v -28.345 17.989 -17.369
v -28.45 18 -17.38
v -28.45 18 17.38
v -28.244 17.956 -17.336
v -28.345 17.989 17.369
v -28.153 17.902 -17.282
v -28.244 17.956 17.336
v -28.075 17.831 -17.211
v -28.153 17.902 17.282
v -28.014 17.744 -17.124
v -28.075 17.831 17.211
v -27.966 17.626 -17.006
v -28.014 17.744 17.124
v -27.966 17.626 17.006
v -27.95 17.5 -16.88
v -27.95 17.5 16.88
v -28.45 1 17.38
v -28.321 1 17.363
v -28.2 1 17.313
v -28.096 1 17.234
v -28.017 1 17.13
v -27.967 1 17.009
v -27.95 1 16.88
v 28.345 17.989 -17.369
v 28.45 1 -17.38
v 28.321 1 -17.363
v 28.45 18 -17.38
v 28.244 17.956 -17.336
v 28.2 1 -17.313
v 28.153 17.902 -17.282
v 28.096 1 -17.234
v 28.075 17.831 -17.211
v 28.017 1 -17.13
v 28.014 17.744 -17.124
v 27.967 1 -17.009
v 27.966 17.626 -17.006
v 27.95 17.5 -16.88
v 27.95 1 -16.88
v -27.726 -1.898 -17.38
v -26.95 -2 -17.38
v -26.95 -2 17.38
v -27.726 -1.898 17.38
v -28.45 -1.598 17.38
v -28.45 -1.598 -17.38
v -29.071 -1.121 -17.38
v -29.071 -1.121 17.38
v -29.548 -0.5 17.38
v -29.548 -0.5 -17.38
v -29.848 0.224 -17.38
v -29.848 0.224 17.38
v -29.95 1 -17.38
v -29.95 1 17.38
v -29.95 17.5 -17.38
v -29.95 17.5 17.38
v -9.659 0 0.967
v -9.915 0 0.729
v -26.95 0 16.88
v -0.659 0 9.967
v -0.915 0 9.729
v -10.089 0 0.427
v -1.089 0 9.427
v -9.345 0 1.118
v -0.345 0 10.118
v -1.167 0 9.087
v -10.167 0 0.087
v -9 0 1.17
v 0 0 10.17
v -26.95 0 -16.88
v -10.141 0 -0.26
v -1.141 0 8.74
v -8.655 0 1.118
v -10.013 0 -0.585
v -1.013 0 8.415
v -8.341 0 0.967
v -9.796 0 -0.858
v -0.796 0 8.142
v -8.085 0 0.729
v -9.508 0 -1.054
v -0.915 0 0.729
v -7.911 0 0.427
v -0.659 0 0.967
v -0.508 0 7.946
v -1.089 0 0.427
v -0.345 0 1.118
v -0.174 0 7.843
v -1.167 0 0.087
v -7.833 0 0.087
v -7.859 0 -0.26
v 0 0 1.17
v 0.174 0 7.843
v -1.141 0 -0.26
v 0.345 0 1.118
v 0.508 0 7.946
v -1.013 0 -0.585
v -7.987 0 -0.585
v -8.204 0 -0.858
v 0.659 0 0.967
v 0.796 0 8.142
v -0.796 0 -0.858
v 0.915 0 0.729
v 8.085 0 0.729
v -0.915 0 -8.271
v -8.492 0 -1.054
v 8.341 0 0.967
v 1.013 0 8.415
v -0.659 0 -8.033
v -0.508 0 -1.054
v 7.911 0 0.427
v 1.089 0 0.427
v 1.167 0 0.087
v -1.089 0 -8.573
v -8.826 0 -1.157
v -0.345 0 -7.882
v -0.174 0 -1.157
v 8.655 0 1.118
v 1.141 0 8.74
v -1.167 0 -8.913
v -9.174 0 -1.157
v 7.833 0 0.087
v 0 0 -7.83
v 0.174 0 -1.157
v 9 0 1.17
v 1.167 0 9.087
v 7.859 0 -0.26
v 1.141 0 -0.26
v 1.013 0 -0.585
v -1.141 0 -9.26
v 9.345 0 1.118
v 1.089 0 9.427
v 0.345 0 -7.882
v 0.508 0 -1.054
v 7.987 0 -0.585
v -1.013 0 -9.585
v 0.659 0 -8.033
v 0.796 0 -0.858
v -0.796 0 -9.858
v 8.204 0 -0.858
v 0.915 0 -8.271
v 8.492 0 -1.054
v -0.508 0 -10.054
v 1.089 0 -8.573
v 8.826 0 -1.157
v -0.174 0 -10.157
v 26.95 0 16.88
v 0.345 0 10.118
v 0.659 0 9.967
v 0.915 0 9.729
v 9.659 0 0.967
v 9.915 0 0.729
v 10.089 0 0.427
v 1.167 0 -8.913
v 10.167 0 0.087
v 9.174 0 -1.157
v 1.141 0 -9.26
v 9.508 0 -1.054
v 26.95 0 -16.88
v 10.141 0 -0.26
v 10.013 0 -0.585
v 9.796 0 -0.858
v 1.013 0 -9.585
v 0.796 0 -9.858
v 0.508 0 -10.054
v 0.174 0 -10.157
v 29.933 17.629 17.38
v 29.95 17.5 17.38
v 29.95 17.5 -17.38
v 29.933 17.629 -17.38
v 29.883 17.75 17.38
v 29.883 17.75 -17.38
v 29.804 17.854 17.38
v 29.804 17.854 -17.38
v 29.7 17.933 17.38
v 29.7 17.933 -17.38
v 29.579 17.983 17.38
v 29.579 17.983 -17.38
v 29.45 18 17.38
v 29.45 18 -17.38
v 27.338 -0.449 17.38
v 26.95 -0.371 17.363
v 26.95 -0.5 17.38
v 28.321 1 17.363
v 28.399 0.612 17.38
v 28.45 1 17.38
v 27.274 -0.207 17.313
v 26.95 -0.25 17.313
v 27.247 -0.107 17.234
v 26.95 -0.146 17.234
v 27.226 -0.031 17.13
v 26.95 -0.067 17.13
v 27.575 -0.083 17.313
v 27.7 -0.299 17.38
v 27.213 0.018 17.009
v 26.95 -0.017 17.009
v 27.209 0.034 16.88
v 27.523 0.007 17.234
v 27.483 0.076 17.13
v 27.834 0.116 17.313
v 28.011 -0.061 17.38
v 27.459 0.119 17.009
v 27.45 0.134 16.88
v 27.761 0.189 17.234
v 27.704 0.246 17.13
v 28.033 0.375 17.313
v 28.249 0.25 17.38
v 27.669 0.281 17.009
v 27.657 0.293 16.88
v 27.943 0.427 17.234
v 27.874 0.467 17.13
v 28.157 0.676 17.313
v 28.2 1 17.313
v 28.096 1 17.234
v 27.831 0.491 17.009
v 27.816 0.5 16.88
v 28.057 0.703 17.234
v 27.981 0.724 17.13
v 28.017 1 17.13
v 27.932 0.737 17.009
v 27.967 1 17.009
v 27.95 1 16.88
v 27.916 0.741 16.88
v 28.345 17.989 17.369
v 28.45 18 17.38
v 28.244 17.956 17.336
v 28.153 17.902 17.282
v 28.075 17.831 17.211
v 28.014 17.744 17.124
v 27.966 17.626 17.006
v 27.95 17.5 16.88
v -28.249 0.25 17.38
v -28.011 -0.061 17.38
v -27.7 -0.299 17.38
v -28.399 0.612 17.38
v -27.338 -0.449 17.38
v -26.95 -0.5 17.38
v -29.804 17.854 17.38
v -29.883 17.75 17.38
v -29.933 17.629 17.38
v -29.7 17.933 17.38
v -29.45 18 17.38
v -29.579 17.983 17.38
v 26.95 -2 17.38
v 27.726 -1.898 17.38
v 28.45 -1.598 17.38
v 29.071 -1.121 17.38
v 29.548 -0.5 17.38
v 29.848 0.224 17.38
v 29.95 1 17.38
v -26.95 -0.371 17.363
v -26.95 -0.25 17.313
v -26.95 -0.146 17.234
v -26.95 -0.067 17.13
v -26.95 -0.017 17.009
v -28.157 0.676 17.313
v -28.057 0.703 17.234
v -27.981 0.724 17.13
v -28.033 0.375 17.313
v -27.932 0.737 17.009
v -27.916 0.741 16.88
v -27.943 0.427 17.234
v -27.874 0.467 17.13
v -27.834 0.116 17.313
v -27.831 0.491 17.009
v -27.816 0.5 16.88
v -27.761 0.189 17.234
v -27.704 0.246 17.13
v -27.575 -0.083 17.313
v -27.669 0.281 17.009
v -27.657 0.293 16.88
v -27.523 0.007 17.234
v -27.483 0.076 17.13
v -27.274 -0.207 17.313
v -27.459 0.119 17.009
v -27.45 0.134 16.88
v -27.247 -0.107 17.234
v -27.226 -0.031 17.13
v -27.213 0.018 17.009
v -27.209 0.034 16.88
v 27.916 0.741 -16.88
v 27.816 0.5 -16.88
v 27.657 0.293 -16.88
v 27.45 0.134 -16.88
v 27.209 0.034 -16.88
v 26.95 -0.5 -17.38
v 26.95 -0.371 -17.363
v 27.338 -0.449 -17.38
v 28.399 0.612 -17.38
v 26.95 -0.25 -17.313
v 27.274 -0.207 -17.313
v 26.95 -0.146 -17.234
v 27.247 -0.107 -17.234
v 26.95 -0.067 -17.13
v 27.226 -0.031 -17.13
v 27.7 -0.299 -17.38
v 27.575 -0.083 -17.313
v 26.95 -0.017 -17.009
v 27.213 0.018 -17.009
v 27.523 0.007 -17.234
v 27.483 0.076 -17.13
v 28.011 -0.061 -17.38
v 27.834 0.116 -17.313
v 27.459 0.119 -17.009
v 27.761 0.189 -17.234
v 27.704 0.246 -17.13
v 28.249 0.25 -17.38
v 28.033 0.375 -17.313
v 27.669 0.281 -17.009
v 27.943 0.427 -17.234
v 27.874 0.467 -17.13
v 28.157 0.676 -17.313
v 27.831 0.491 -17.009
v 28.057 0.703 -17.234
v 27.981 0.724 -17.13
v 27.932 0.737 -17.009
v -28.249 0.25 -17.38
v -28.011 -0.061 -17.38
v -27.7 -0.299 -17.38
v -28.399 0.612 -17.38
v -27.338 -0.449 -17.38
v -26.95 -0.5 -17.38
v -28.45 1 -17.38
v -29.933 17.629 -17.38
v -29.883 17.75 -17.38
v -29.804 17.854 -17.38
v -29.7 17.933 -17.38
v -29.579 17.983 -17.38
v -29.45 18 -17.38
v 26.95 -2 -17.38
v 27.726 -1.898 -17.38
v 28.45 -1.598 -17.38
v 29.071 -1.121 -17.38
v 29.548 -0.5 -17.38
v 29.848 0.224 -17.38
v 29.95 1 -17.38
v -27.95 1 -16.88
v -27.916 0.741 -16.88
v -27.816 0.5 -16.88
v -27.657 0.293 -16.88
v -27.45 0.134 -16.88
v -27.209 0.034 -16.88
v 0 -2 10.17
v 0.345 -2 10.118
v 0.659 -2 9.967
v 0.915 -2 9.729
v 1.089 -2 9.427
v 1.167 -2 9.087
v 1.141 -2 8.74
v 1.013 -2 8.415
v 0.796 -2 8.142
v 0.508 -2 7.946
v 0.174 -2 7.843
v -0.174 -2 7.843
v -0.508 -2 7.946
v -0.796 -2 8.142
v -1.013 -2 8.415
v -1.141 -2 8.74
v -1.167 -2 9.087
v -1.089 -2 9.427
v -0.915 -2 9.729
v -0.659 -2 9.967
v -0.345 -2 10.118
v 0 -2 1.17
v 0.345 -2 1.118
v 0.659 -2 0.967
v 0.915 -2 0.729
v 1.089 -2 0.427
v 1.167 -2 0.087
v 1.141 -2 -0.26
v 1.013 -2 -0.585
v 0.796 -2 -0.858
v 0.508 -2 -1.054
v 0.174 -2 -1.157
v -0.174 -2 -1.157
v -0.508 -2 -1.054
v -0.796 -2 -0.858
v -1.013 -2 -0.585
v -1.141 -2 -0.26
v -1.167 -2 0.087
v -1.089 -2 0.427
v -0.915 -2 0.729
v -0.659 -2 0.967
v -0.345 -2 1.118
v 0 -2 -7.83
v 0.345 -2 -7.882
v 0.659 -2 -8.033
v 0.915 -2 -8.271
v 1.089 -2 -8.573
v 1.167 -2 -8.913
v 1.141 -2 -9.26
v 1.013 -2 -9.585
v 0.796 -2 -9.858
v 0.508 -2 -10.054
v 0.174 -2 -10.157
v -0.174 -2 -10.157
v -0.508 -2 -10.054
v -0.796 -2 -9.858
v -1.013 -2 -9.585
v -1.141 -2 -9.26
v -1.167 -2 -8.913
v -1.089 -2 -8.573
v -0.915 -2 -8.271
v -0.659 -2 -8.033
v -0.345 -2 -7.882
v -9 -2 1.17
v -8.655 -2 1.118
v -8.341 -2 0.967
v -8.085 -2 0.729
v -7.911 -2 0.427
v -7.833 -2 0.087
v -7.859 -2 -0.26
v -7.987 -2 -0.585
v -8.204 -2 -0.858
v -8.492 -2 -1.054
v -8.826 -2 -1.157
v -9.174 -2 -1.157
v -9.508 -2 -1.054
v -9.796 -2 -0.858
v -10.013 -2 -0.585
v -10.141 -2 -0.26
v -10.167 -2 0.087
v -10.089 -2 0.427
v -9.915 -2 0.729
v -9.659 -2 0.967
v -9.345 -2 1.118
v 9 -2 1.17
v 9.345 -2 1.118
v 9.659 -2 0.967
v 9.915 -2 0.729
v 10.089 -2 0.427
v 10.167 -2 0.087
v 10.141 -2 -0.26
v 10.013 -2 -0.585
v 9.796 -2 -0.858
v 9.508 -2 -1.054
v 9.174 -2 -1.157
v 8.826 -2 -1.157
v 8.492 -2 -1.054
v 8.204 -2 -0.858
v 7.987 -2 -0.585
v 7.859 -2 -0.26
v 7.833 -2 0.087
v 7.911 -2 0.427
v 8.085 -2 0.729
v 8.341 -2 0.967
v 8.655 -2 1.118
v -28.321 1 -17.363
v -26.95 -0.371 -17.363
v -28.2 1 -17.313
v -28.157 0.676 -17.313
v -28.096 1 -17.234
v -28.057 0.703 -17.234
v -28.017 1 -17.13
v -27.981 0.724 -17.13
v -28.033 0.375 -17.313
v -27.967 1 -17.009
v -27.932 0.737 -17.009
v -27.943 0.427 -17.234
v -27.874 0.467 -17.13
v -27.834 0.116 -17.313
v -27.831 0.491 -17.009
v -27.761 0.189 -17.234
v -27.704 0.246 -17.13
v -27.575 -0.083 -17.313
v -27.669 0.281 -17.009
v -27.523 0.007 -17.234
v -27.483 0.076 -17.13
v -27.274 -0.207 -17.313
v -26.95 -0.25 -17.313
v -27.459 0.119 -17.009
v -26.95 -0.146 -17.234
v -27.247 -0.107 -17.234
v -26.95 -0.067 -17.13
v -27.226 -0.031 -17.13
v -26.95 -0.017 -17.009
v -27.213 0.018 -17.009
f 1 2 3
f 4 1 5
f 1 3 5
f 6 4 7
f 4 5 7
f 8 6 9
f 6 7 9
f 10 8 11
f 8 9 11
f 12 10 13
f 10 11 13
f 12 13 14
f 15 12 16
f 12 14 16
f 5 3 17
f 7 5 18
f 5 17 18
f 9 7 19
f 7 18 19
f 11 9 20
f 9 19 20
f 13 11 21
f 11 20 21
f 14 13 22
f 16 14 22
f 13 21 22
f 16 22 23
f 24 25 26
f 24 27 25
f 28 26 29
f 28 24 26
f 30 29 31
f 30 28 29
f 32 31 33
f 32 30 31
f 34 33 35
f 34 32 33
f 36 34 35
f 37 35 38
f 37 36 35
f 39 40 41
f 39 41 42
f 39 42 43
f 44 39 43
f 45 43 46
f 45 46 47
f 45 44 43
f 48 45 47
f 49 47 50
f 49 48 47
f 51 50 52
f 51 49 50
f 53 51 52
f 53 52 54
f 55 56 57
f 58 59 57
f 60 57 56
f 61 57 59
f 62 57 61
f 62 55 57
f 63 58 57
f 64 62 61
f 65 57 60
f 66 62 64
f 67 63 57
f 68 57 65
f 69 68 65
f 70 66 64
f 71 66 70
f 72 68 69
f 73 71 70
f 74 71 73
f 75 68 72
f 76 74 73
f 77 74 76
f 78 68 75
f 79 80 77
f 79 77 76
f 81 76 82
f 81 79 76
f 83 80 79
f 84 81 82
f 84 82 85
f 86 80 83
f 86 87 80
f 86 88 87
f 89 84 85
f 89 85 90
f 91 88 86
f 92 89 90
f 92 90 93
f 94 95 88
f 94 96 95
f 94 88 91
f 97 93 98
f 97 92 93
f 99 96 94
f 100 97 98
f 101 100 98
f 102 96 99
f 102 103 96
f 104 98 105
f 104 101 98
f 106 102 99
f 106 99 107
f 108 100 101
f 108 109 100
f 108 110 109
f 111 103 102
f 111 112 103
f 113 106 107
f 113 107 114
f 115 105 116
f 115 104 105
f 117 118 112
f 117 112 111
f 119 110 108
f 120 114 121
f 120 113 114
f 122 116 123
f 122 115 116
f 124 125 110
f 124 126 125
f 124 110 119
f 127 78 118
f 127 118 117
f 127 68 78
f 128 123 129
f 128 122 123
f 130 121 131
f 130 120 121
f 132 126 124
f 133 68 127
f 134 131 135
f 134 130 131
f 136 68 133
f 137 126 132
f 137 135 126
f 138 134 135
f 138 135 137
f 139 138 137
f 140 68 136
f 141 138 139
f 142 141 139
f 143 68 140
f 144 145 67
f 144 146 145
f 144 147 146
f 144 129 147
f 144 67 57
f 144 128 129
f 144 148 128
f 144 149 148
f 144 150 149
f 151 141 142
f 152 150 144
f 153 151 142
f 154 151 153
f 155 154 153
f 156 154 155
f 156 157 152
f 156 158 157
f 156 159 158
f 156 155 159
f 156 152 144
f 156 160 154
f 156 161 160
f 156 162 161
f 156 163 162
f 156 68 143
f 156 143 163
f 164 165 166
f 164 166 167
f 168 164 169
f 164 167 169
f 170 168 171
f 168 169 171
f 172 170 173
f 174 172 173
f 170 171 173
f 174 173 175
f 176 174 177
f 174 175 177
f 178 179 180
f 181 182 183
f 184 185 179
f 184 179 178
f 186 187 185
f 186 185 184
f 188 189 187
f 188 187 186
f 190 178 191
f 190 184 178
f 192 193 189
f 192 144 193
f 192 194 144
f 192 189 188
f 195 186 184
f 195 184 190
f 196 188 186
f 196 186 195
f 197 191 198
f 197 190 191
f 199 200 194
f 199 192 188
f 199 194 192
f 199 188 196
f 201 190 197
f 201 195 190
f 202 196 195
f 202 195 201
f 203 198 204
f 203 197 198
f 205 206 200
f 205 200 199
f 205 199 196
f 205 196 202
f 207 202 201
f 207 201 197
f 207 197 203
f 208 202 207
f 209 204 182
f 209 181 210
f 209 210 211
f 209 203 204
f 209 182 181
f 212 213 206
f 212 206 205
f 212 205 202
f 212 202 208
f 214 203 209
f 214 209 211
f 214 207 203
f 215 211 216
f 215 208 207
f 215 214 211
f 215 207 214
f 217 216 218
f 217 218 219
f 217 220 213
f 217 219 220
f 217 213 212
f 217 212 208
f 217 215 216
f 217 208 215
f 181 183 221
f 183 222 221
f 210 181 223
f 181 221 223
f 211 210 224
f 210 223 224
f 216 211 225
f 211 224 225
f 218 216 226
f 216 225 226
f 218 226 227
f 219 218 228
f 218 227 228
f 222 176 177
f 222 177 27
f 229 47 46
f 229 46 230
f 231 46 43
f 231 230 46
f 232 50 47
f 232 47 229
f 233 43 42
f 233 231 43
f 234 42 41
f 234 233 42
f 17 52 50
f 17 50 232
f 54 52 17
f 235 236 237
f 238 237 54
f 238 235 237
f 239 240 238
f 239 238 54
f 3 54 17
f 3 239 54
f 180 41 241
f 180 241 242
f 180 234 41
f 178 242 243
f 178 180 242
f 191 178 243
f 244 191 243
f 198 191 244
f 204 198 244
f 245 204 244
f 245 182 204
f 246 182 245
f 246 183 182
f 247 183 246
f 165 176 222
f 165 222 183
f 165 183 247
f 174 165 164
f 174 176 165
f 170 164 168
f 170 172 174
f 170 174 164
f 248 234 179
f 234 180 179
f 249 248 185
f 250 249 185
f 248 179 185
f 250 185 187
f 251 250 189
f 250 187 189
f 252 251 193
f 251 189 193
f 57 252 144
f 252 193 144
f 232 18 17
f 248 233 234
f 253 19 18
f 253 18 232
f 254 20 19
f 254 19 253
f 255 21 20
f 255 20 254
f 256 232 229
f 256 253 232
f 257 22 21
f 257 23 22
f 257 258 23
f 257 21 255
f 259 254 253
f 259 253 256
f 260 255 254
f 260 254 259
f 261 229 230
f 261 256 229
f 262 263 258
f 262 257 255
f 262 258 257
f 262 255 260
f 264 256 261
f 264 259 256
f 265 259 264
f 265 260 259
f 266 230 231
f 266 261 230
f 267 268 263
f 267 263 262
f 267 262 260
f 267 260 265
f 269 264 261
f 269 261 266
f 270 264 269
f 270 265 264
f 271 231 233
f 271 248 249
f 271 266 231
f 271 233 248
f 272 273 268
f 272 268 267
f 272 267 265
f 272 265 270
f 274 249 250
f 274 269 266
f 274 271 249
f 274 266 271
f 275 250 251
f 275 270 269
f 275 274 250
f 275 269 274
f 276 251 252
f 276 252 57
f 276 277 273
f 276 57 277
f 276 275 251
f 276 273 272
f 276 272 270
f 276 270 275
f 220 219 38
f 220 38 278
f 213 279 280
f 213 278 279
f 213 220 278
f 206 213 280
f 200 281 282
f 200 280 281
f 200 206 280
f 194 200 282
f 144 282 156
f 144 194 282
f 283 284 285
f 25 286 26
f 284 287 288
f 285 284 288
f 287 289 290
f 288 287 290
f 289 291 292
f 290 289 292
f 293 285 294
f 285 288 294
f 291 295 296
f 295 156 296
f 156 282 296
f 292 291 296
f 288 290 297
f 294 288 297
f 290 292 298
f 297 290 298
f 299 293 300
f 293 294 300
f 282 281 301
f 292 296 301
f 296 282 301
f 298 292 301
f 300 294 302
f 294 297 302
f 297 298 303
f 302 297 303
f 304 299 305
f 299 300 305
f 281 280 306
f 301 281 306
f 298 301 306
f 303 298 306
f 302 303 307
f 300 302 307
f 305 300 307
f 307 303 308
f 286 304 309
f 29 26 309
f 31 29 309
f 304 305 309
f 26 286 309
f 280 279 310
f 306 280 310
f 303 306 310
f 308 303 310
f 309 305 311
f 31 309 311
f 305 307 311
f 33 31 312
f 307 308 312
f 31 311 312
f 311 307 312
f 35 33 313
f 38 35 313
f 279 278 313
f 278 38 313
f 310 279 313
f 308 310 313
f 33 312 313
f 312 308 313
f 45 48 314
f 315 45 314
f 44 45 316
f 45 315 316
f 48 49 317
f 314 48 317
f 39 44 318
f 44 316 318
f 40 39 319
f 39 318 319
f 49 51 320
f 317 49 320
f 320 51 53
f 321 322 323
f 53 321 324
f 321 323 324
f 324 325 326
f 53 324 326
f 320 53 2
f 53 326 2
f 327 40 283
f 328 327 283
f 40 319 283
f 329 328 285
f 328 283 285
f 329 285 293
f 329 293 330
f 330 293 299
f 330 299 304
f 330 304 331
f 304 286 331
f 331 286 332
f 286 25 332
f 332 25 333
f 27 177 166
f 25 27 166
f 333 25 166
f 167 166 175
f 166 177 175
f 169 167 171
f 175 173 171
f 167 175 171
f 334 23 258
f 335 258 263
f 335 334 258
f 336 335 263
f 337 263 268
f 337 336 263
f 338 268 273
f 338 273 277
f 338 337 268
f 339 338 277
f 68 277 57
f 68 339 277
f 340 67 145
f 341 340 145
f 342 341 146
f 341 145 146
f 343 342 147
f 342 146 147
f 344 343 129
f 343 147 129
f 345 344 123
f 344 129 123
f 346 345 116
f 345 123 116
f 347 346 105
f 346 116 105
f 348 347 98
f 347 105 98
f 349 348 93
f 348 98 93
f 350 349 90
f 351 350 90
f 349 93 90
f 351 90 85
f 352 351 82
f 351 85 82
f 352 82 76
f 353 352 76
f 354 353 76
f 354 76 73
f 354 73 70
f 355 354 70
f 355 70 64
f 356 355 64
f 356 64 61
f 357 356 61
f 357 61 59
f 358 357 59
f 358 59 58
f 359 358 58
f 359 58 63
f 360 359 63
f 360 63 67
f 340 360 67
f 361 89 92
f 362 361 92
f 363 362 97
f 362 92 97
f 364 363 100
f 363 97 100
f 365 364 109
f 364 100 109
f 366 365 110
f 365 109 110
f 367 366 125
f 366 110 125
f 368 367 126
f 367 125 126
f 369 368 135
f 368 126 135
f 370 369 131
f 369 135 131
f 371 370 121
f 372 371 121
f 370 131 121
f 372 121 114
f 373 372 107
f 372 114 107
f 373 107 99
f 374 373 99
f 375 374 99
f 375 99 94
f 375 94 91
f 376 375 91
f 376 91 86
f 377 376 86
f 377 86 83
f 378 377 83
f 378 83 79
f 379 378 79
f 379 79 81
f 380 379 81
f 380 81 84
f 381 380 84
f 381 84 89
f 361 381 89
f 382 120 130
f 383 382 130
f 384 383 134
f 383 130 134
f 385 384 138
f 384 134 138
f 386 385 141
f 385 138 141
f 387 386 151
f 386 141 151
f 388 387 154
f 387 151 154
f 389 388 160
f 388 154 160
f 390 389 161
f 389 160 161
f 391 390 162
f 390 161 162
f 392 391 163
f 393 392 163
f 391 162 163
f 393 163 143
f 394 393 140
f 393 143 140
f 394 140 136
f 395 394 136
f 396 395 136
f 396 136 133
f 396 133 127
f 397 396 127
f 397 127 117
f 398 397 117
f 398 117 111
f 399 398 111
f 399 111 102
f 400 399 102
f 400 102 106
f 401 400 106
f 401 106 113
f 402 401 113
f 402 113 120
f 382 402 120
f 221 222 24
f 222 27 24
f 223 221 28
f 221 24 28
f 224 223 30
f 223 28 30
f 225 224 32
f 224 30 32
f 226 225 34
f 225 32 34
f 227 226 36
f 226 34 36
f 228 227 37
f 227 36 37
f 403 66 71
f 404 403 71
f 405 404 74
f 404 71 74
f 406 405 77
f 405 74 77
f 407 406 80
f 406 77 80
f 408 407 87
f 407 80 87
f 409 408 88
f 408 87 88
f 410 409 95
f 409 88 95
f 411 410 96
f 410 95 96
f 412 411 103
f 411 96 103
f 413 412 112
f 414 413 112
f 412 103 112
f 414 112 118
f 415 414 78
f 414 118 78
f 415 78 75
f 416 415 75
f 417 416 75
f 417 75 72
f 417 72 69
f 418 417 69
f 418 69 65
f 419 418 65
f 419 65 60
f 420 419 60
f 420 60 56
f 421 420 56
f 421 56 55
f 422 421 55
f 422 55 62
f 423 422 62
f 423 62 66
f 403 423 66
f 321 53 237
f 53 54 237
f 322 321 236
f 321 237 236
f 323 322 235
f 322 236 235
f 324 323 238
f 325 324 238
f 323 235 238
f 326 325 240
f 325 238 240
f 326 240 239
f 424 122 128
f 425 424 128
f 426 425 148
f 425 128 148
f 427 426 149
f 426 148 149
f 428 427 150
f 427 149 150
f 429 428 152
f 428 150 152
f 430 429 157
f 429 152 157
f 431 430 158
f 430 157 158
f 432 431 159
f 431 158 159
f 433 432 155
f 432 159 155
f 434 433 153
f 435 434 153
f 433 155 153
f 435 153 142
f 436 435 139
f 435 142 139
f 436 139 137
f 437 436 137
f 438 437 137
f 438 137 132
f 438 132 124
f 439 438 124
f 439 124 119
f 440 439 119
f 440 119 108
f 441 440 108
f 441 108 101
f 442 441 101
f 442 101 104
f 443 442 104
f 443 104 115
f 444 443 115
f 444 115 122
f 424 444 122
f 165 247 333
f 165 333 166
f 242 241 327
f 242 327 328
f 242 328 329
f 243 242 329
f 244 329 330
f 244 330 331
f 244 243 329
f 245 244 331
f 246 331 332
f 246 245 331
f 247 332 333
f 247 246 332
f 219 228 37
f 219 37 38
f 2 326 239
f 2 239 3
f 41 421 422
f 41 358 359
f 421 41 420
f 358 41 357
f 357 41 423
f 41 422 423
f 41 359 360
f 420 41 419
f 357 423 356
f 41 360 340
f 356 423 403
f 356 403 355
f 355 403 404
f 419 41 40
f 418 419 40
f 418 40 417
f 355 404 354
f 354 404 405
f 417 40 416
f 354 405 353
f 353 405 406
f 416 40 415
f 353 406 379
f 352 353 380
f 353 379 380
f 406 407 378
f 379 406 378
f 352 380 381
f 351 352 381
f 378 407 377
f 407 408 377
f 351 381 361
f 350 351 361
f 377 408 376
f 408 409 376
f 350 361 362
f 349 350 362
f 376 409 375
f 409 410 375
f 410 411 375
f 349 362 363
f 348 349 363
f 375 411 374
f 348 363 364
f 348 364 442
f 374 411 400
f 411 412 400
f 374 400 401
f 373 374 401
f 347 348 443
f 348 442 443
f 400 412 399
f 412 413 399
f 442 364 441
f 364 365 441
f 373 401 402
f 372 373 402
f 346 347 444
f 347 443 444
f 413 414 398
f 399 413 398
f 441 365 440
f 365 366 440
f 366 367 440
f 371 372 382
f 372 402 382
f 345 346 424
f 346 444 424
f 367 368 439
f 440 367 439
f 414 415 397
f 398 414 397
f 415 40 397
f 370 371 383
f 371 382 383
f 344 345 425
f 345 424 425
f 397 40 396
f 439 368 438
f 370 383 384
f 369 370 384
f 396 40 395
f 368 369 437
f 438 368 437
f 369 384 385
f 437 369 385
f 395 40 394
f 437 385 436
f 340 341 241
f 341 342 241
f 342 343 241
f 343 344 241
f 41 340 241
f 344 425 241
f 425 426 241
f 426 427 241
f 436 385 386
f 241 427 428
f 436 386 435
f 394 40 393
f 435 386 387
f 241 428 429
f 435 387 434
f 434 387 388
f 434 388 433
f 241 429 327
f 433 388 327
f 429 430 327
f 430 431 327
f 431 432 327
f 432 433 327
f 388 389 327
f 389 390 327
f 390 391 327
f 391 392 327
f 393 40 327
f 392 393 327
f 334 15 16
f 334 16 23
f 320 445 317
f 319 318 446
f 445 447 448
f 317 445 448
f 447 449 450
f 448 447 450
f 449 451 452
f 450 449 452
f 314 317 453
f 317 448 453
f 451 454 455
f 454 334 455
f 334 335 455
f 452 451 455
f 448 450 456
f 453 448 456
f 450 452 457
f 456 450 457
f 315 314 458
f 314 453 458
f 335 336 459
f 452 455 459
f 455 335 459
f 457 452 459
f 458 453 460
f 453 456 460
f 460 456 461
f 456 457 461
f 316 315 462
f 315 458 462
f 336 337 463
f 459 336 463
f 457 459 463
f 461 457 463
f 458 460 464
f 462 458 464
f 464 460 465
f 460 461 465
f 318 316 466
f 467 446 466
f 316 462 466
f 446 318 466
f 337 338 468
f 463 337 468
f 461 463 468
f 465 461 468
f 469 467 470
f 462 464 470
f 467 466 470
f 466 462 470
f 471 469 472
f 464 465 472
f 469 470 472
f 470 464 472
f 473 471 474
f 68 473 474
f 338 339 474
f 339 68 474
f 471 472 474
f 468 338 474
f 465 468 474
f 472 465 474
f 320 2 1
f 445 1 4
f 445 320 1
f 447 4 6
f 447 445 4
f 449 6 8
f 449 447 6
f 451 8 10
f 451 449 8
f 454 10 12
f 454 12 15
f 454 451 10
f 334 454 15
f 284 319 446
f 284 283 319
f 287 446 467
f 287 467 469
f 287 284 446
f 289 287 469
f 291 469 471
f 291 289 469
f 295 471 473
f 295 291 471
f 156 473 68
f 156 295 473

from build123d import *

# Parameters (mm, degrees)
SKETCH1_W                      = 59.9
SKETCH1_H                      = 34.76
BASE_FLANGE1_DEPTH             = 2
EDGE_FLANGE1_STRIP_W           = 10
EDGE_FLANGE1_STRIP_H           = 2
EDGE_FLANGE1_STRIP_CUT_DEPTH   = 34.76
EDGE_FLANGE1_STRIP_2_W         = 10
EDGE_FLANGE1_STRIP_2_H         = 2
EDGE_FLANGE1_STRIP_CUT_2_DEPTH = 34.76
EDGE_FLANGE1_DEPTH             = 34.76
EDGE_FLANGE1_BEND_DEPTH        = 34.76
FILLET1_R                      = 0.5
SKETCH8_R                      = 1.17
CUT_EXTRUDE1_DEPTH             = 10


# Sheet-metal steps are written as plain solids
with BuildPart() as part:
    # Sketch1 → Base-Flange1 (new body)
    with BuildSketch(Plane(origin=(0, 0, 0), x_dir=(1, 0, 0), z_dir=(0, 1, 0))):
        Rectangle(SKETCH1_W, SKETCH1_H)
    extrude(amount=-BASE_FLANGE1_DEPTH)

    # Edge-Flange1 strip (across the edge) → Edge-Flange1 strip cut (cut)
    with BuildSketch(Plane(origin=(-29.95, 0, -17.38), x_dir=(1, 0, 0), z_dir=(0, 0, 1))):
        with Locations((-2, -1)):
            Rectangle(EDGE_FLANGE1_STRIP_W, EDGE_FLANGE1_STRIP_H)
    extrude(amount=EDGE_FLANGE1_STRIP_CUT_DEPTH, mode=Mode.SUBTRACT)

    # Edge-Flange1 strip 2 (across the edge) → Edge-Flange1 strip cut 2 (cut)
    with BuildSketch(Plane(origin=(29.95, 0, 17.38), x_dir=(-1, 0, 0), z_dir=(0, 0, -1))):
        with Locations((-2, -1)):
            Rectangle(EDGE_FLANGE1_STRIP_2_W, EDGE_FLANGE1_STRIP_2_H)
    extrude(amount=EDGE_FLANGE1_STRIP_CUT_2_DEPTH, mode=Mode.SUBTRACT)

    # Edge-Flange1 section (across the edge) → Edge-Flange1 (add)
    with BuildSketch(Plane(origin=(-29.95, 0, -17.38), x_dir=(1, 0, 0), z_dir=(0, 0, 1))):
        with BuildLine():
            Line((0, 1), (0, 18))
            Line((0, 18), (2, 18))
            Line((2, 18), (2, 1))
            ThreePointArc((2, 1), (2.292893219, 0.292893219), (3, 0))
            Line((3, 0), (3, -2))
            ThreePointArc((3, -2), (0.878679656, -1.121320344), (0, 1))
        make_face()
    extrude(amount=EDGE_FLANGE1_DEPTH)

    # Edge-Flange1 section 2 (across the edge) → Edge-Flange1 bend (add)
    with BuildSketch(Plane(origin=(29.95, 0, 17.38), x_dir=(-1, 0, 0), z_dir=(0, 0, -1))):
        with BuildLine():
            Line((0, 1), (0, 18))
            Line((0, 18), (2, 18))
            Line((2, 18), (2, 1))
            ThreePointArc((2, 1), (2.292893219, 0.292893219), (3, 0))
            Line((3, 0), (3, -2))
            ThreePointArc((3, -2), (0.878679656, -1.121320344), (0, 1))
        make_face()
    extrude(amount=EDGE_FLANGE1_BEND_DEPTH)

    # Fillet1
    fillet1_edges = [part.edges().sort_by_distance(p)[0] for p in [
        (0, 0, 17.38),
        (0, 0, -17.38),
        (-27.657106781, 0.292893219, -17.38),
        (-27.657106781, 0.292893219, 17.38),
        (-27.95, 9.5, 17.38),
        (-27.95, 9.5, -17.38),
        (-29.95, 18, 0),
        (-27.95, 18, 0),
        (27.657106781, 0.292893219, 17.38),
        (27.657106781, 0.292893219, -17.38),
        (27.95, 9.5, 17.38),
        (27.95, 9.5, -17.38),
        (29.95, 18, 0),
        (27.95, 18, 0),
    ]]
    fillet(fillet1_edges, radius=FILLET1_R)

    # Sketch8 → Cut-Extrude1 (cut)
    with BuildSketch(Plane(origin=(0, 0, 0), x_dir=(1, 0, 0), z_dir=(0, 1, 0))):
        with Locations(Location((0, 0, 0), (0, 0, 270))):
            Circle(SKETCH8_R)
        with Locations(Location((0, 9, 0), (0, 0, 270))):
            Circle(SKETCH8_R)
        with Locations(Location((9, 0, 0), (0, 0, 270))):
            Circle(SKETCH8_R)
        with Locations(Location((0, -9, 0), (0, 0, 270))):
            Circle(SKETCH8_R)
        with Locations(Location((-9, 0, 0), (0, 0, 270))):
            Circle(SKETCH8_R)
    extrude(amount=-CUT_EXTRUDE1_DEPTH, mode=Mode.SUBTRACT)


solid = part.part
